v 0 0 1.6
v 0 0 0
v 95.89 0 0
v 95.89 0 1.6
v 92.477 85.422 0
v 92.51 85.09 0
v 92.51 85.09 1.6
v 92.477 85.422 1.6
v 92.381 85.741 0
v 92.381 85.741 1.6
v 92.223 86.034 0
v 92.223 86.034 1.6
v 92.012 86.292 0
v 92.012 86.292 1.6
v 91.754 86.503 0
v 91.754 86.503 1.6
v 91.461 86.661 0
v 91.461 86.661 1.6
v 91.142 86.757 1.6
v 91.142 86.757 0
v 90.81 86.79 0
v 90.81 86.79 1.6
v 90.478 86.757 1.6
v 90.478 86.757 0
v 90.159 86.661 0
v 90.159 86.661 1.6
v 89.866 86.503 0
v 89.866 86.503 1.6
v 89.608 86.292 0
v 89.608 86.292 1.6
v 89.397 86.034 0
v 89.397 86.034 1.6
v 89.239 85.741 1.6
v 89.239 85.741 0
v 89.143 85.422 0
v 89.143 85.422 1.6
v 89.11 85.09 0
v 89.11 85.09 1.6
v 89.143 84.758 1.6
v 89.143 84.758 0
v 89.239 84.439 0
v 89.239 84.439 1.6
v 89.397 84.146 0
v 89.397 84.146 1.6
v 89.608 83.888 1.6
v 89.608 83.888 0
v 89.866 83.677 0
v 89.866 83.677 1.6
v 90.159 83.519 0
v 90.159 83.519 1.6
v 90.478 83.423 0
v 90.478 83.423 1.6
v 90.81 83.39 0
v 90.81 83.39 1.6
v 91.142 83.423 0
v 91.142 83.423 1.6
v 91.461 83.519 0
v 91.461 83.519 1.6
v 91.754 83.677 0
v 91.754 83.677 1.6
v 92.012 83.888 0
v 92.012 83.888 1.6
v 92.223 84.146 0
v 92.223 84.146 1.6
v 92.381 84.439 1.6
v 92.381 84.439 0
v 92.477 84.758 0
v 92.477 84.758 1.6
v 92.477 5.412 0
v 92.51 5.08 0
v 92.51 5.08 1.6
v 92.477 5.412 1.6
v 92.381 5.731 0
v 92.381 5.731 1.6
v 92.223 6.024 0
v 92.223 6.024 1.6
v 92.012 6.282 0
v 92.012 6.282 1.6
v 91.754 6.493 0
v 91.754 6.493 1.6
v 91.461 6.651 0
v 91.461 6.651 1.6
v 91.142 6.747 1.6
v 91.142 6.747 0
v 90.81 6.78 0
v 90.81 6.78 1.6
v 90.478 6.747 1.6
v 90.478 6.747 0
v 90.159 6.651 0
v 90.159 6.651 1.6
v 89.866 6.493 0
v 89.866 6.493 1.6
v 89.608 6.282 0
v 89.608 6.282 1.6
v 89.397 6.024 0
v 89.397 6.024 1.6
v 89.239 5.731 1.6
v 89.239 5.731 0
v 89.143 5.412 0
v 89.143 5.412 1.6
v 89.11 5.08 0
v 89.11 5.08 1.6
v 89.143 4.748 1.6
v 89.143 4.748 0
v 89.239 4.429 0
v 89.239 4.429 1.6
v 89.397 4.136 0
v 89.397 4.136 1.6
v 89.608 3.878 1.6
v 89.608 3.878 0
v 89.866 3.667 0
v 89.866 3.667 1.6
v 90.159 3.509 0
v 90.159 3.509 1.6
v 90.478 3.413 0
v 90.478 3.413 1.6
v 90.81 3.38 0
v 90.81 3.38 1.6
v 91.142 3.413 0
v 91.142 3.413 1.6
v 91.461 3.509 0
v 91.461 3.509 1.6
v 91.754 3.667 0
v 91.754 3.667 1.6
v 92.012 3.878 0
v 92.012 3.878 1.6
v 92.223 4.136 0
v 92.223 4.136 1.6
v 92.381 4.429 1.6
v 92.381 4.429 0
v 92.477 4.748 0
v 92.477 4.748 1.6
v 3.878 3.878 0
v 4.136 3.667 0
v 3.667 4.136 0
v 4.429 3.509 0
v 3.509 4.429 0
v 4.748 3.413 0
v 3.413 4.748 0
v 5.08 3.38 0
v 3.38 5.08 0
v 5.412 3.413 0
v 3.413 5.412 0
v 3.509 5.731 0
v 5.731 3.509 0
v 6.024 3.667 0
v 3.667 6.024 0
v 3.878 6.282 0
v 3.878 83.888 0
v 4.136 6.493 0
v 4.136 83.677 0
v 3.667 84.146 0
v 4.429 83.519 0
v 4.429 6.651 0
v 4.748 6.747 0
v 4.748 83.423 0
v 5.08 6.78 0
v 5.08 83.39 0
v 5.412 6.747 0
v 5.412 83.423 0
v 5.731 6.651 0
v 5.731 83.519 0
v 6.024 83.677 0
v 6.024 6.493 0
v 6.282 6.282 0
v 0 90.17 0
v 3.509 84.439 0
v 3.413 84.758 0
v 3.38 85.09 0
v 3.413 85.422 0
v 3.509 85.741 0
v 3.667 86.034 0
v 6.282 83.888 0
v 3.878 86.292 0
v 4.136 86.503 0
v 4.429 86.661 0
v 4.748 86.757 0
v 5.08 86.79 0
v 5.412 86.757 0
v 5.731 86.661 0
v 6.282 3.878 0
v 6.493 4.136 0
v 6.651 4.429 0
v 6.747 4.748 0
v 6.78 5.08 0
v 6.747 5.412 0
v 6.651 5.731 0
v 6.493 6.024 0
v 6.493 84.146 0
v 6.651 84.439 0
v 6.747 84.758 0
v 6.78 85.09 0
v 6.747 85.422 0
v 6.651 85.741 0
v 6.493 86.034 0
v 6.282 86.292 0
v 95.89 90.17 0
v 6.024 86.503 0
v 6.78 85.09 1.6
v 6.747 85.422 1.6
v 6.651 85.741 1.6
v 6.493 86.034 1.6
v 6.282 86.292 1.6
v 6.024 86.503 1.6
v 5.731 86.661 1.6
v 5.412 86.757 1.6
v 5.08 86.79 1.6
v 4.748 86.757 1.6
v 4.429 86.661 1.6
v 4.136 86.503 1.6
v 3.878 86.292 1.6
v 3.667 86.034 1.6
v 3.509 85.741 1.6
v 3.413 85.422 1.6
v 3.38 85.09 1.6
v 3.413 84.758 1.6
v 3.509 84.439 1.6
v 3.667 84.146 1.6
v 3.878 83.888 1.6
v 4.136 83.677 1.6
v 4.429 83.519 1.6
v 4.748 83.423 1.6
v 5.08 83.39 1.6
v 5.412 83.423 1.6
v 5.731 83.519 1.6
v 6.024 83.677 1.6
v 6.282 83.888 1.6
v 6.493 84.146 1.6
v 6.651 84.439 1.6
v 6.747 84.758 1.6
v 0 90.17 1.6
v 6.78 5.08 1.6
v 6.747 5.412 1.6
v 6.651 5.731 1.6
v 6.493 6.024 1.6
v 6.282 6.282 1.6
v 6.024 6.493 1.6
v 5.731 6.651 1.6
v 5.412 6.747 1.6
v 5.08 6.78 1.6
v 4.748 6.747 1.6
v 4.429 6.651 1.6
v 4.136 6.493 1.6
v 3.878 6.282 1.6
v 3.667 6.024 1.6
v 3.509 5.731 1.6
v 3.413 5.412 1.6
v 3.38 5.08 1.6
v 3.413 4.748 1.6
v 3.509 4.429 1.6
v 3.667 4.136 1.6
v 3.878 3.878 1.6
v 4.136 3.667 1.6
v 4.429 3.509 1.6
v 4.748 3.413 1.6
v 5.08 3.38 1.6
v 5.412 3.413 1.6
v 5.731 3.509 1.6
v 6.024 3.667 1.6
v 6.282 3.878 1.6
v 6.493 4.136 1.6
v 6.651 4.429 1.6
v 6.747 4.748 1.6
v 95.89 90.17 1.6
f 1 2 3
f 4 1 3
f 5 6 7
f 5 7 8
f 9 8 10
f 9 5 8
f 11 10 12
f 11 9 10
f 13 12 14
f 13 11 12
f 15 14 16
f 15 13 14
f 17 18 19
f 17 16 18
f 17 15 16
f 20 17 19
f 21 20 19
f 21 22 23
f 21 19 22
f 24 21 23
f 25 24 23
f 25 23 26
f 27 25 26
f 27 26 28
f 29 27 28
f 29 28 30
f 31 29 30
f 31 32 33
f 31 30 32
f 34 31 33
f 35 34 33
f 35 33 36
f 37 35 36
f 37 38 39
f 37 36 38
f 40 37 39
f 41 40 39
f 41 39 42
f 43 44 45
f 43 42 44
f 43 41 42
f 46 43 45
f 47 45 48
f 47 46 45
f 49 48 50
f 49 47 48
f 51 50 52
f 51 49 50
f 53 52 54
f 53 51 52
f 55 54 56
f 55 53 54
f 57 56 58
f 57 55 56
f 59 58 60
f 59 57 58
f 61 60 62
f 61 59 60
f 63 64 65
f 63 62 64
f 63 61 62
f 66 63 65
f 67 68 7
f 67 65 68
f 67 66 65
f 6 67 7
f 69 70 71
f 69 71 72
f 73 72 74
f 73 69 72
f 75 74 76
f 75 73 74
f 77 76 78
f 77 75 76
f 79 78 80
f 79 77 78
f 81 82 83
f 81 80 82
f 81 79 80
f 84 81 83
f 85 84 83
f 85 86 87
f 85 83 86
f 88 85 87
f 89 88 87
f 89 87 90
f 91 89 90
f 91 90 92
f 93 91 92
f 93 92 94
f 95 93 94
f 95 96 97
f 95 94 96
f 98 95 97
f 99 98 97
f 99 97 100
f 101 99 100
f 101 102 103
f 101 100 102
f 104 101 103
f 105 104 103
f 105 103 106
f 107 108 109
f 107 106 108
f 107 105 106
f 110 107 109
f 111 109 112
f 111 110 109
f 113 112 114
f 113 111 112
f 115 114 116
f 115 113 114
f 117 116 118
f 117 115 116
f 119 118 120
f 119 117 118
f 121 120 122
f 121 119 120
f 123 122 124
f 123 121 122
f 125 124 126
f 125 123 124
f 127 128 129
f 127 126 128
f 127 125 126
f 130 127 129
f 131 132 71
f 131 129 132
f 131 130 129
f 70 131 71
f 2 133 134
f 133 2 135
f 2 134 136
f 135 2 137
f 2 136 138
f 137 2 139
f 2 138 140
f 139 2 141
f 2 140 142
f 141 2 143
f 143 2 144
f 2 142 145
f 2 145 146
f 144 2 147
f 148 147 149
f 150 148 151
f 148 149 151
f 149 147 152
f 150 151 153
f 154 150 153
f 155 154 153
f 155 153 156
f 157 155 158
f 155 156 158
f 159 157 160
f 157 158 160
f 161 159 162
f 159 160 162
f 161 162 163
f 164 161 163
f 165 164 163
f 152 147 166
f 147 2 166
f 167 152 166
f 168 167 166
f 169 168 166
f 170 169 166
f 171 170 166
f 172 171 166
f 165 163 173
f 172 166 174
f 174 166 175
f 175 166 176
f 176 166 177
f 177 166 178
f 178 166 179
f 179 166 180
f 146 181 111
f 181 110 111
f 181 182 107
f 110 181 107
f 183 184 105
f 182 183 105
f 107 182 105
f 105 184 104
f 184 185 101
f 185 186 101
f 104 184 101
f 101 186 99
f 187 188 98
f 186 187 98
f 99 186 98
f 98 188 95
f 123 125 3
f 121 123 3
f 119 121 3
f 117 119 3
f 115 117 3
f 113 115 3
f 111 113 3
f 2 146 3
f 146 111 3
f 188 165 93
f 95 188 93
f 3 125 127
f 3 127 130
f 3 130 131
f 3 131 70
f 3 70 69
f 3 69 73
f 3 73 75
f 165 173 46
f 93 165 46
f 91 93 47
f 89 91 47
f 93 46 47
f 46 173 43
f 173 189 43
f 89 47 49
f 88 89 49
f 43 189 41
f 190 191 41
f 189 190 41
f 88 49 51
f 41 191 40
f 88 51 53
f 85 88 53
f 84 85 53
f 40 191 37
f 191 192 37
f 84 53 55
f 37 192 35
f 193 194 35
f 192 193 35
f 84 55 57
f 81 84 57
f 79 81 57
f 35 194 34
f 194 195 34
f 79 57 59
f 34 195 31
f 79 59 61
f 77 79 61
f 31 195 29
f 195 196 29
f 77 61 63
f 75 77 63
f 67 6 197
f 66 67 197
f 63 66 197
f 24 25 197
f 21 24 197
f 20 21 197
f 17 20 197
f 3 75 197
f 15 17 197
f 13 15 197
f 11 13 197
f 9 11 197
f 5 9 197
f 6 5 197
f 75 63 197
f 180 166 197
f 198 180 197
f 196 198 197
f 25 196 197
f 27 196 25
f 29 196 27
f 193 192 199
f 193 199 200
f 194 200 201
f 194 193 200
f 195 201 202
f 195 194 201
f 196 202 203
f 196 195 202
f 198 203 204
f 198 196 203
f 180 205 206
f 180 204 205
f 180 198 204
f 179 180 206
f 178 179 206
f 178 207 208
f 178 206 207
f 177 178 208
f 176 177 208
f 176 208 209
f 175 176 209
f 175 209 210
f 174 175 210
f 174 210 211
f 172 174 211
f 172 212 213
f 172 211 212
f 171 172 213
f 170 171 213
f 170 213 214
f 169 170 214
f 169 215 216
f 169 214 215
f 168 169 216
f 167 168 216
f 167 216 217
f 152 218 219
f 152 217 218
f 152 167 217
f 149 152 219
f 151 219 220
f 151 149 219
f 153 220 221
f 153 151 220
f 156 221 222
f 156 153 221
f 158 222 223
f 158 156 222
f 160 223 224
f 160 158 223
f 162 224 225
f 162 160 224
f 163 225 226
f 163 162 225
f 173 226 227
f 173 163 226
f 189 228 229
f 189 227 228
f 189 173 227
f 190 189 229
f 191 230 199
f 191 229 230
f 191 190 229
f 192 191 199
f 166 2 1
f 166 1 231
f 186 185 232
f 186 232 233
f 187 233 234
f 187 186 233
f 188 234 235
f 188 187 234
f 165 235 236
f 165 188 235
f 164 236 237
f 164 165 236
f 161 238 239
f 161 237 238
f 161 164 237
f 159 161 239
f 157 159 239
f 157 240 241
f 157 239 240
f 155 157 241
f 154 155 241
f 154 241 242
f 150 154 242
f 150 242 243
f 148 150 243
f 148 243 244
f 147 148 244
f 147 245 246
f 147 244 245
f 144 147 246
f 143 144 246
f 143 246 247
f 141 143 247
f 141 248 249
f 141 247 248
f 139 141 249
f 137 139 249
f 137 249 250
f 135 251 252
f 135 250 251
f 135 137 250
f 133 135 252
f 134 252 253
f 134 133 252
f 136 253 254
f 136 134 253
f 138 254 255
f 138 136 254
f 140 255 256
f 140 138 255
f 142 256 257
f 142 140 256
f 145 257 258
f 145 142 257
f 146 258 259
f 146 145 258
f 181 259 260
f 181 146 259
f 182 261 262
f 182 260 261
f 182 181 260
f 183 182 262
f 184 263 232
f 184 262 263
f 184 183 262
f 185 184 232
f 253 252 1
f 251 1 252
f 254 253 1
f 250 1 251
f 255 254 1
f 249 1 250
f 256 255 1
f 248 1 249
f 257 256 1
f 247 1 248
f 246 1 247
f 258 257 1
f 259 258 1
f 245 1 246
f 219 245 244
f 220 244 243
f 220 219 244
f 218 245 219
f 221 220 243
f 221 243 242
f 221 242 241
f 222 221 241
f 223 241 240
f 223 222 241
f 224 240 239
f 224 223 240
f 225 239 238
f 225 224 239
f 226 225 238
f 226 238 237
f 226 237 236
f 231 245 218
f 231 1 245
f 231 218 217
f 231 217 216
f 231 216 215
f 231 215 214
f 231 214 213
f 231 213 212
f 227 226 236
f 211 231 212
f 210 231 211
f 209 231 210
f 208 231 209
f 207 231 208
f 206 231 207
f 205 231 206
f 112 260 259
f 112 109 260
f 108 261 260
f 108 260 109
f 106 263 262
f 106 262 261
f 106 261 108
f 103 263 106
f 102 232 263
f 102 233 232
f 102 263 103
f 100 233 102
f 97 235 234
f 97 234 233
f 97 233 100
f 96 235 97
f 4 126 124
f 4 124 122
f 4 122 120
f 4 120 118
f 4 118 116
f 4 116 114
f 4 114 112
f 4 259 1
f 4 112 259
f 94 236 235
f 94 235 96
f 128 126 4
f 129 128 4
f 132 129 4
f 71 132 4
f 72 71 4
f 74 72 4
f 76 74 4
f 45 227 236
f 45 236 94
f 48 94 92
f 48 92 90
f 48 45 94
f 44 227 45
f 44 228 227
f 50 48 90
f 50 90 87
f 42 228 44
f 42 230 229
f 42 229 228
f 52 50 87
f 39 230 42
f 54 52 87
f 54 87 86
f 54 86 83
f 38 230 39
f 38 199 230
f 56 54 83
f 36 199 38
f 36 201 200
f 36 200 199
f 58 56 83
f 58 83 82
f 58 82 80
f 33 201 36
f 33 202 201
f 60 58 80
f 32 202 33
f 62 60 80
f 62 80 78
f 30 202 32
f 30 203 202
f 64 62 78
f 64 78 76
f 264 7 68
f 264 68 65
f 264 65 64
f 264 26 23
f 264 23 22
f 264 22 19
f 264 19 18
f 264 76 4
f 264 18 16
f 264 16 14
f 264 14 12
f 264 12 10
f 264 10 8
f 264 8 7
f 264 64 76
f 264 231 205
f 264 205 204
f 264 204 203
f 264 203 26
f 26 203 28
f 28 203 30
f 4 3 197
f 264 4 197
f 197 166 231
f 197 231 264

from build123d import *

# Parameters (mm, degrees)
BODY_SKETCH_W    = 95.89
BODY_SKETCH_H    = 90.17
BODY_DEPTH       = 1.6
HOLES_DEPTH      = 132.636169042
HOLES_DEPTH_BACK = 132.636169042
HOLES_SKETCH_R   = 1.7


with BuildPart() as part:
    # Body sketch → Body (new body)
    with BuildSketch(Plane.XY):
        with Locations((47.945, 45.085)):
            Rectangle(BODY_SKETCH_W, BODY_SKETCH_H)
    extrude(amount=BODY_DEPTH)

    # Holes sketch → Holes (cut, two sides: drawn at the far end of the back side and taken through both)
    with BuildSketch(Plane.XY.offset(-HOLES_DEPTH_BACK)):
        with Locations((5.08, 5.08)):
            Circle(HOLES_SKETCH_R)
        with Locations((90.81, 5.08)):
            Circle(HOLES_SKETCH_R)
        with Locations((5.08, 85.09)):
            Circle(HOLES_SKETCH_R)
        with Locations((90.81, 85.09)):
            Circle(HOLES_SKETCH_R)
    extrude(amount=HOLES_DEPTH + HOLES_DEPTH_BACK, mode=Mode.SUBTRACT)


solid = part.part
